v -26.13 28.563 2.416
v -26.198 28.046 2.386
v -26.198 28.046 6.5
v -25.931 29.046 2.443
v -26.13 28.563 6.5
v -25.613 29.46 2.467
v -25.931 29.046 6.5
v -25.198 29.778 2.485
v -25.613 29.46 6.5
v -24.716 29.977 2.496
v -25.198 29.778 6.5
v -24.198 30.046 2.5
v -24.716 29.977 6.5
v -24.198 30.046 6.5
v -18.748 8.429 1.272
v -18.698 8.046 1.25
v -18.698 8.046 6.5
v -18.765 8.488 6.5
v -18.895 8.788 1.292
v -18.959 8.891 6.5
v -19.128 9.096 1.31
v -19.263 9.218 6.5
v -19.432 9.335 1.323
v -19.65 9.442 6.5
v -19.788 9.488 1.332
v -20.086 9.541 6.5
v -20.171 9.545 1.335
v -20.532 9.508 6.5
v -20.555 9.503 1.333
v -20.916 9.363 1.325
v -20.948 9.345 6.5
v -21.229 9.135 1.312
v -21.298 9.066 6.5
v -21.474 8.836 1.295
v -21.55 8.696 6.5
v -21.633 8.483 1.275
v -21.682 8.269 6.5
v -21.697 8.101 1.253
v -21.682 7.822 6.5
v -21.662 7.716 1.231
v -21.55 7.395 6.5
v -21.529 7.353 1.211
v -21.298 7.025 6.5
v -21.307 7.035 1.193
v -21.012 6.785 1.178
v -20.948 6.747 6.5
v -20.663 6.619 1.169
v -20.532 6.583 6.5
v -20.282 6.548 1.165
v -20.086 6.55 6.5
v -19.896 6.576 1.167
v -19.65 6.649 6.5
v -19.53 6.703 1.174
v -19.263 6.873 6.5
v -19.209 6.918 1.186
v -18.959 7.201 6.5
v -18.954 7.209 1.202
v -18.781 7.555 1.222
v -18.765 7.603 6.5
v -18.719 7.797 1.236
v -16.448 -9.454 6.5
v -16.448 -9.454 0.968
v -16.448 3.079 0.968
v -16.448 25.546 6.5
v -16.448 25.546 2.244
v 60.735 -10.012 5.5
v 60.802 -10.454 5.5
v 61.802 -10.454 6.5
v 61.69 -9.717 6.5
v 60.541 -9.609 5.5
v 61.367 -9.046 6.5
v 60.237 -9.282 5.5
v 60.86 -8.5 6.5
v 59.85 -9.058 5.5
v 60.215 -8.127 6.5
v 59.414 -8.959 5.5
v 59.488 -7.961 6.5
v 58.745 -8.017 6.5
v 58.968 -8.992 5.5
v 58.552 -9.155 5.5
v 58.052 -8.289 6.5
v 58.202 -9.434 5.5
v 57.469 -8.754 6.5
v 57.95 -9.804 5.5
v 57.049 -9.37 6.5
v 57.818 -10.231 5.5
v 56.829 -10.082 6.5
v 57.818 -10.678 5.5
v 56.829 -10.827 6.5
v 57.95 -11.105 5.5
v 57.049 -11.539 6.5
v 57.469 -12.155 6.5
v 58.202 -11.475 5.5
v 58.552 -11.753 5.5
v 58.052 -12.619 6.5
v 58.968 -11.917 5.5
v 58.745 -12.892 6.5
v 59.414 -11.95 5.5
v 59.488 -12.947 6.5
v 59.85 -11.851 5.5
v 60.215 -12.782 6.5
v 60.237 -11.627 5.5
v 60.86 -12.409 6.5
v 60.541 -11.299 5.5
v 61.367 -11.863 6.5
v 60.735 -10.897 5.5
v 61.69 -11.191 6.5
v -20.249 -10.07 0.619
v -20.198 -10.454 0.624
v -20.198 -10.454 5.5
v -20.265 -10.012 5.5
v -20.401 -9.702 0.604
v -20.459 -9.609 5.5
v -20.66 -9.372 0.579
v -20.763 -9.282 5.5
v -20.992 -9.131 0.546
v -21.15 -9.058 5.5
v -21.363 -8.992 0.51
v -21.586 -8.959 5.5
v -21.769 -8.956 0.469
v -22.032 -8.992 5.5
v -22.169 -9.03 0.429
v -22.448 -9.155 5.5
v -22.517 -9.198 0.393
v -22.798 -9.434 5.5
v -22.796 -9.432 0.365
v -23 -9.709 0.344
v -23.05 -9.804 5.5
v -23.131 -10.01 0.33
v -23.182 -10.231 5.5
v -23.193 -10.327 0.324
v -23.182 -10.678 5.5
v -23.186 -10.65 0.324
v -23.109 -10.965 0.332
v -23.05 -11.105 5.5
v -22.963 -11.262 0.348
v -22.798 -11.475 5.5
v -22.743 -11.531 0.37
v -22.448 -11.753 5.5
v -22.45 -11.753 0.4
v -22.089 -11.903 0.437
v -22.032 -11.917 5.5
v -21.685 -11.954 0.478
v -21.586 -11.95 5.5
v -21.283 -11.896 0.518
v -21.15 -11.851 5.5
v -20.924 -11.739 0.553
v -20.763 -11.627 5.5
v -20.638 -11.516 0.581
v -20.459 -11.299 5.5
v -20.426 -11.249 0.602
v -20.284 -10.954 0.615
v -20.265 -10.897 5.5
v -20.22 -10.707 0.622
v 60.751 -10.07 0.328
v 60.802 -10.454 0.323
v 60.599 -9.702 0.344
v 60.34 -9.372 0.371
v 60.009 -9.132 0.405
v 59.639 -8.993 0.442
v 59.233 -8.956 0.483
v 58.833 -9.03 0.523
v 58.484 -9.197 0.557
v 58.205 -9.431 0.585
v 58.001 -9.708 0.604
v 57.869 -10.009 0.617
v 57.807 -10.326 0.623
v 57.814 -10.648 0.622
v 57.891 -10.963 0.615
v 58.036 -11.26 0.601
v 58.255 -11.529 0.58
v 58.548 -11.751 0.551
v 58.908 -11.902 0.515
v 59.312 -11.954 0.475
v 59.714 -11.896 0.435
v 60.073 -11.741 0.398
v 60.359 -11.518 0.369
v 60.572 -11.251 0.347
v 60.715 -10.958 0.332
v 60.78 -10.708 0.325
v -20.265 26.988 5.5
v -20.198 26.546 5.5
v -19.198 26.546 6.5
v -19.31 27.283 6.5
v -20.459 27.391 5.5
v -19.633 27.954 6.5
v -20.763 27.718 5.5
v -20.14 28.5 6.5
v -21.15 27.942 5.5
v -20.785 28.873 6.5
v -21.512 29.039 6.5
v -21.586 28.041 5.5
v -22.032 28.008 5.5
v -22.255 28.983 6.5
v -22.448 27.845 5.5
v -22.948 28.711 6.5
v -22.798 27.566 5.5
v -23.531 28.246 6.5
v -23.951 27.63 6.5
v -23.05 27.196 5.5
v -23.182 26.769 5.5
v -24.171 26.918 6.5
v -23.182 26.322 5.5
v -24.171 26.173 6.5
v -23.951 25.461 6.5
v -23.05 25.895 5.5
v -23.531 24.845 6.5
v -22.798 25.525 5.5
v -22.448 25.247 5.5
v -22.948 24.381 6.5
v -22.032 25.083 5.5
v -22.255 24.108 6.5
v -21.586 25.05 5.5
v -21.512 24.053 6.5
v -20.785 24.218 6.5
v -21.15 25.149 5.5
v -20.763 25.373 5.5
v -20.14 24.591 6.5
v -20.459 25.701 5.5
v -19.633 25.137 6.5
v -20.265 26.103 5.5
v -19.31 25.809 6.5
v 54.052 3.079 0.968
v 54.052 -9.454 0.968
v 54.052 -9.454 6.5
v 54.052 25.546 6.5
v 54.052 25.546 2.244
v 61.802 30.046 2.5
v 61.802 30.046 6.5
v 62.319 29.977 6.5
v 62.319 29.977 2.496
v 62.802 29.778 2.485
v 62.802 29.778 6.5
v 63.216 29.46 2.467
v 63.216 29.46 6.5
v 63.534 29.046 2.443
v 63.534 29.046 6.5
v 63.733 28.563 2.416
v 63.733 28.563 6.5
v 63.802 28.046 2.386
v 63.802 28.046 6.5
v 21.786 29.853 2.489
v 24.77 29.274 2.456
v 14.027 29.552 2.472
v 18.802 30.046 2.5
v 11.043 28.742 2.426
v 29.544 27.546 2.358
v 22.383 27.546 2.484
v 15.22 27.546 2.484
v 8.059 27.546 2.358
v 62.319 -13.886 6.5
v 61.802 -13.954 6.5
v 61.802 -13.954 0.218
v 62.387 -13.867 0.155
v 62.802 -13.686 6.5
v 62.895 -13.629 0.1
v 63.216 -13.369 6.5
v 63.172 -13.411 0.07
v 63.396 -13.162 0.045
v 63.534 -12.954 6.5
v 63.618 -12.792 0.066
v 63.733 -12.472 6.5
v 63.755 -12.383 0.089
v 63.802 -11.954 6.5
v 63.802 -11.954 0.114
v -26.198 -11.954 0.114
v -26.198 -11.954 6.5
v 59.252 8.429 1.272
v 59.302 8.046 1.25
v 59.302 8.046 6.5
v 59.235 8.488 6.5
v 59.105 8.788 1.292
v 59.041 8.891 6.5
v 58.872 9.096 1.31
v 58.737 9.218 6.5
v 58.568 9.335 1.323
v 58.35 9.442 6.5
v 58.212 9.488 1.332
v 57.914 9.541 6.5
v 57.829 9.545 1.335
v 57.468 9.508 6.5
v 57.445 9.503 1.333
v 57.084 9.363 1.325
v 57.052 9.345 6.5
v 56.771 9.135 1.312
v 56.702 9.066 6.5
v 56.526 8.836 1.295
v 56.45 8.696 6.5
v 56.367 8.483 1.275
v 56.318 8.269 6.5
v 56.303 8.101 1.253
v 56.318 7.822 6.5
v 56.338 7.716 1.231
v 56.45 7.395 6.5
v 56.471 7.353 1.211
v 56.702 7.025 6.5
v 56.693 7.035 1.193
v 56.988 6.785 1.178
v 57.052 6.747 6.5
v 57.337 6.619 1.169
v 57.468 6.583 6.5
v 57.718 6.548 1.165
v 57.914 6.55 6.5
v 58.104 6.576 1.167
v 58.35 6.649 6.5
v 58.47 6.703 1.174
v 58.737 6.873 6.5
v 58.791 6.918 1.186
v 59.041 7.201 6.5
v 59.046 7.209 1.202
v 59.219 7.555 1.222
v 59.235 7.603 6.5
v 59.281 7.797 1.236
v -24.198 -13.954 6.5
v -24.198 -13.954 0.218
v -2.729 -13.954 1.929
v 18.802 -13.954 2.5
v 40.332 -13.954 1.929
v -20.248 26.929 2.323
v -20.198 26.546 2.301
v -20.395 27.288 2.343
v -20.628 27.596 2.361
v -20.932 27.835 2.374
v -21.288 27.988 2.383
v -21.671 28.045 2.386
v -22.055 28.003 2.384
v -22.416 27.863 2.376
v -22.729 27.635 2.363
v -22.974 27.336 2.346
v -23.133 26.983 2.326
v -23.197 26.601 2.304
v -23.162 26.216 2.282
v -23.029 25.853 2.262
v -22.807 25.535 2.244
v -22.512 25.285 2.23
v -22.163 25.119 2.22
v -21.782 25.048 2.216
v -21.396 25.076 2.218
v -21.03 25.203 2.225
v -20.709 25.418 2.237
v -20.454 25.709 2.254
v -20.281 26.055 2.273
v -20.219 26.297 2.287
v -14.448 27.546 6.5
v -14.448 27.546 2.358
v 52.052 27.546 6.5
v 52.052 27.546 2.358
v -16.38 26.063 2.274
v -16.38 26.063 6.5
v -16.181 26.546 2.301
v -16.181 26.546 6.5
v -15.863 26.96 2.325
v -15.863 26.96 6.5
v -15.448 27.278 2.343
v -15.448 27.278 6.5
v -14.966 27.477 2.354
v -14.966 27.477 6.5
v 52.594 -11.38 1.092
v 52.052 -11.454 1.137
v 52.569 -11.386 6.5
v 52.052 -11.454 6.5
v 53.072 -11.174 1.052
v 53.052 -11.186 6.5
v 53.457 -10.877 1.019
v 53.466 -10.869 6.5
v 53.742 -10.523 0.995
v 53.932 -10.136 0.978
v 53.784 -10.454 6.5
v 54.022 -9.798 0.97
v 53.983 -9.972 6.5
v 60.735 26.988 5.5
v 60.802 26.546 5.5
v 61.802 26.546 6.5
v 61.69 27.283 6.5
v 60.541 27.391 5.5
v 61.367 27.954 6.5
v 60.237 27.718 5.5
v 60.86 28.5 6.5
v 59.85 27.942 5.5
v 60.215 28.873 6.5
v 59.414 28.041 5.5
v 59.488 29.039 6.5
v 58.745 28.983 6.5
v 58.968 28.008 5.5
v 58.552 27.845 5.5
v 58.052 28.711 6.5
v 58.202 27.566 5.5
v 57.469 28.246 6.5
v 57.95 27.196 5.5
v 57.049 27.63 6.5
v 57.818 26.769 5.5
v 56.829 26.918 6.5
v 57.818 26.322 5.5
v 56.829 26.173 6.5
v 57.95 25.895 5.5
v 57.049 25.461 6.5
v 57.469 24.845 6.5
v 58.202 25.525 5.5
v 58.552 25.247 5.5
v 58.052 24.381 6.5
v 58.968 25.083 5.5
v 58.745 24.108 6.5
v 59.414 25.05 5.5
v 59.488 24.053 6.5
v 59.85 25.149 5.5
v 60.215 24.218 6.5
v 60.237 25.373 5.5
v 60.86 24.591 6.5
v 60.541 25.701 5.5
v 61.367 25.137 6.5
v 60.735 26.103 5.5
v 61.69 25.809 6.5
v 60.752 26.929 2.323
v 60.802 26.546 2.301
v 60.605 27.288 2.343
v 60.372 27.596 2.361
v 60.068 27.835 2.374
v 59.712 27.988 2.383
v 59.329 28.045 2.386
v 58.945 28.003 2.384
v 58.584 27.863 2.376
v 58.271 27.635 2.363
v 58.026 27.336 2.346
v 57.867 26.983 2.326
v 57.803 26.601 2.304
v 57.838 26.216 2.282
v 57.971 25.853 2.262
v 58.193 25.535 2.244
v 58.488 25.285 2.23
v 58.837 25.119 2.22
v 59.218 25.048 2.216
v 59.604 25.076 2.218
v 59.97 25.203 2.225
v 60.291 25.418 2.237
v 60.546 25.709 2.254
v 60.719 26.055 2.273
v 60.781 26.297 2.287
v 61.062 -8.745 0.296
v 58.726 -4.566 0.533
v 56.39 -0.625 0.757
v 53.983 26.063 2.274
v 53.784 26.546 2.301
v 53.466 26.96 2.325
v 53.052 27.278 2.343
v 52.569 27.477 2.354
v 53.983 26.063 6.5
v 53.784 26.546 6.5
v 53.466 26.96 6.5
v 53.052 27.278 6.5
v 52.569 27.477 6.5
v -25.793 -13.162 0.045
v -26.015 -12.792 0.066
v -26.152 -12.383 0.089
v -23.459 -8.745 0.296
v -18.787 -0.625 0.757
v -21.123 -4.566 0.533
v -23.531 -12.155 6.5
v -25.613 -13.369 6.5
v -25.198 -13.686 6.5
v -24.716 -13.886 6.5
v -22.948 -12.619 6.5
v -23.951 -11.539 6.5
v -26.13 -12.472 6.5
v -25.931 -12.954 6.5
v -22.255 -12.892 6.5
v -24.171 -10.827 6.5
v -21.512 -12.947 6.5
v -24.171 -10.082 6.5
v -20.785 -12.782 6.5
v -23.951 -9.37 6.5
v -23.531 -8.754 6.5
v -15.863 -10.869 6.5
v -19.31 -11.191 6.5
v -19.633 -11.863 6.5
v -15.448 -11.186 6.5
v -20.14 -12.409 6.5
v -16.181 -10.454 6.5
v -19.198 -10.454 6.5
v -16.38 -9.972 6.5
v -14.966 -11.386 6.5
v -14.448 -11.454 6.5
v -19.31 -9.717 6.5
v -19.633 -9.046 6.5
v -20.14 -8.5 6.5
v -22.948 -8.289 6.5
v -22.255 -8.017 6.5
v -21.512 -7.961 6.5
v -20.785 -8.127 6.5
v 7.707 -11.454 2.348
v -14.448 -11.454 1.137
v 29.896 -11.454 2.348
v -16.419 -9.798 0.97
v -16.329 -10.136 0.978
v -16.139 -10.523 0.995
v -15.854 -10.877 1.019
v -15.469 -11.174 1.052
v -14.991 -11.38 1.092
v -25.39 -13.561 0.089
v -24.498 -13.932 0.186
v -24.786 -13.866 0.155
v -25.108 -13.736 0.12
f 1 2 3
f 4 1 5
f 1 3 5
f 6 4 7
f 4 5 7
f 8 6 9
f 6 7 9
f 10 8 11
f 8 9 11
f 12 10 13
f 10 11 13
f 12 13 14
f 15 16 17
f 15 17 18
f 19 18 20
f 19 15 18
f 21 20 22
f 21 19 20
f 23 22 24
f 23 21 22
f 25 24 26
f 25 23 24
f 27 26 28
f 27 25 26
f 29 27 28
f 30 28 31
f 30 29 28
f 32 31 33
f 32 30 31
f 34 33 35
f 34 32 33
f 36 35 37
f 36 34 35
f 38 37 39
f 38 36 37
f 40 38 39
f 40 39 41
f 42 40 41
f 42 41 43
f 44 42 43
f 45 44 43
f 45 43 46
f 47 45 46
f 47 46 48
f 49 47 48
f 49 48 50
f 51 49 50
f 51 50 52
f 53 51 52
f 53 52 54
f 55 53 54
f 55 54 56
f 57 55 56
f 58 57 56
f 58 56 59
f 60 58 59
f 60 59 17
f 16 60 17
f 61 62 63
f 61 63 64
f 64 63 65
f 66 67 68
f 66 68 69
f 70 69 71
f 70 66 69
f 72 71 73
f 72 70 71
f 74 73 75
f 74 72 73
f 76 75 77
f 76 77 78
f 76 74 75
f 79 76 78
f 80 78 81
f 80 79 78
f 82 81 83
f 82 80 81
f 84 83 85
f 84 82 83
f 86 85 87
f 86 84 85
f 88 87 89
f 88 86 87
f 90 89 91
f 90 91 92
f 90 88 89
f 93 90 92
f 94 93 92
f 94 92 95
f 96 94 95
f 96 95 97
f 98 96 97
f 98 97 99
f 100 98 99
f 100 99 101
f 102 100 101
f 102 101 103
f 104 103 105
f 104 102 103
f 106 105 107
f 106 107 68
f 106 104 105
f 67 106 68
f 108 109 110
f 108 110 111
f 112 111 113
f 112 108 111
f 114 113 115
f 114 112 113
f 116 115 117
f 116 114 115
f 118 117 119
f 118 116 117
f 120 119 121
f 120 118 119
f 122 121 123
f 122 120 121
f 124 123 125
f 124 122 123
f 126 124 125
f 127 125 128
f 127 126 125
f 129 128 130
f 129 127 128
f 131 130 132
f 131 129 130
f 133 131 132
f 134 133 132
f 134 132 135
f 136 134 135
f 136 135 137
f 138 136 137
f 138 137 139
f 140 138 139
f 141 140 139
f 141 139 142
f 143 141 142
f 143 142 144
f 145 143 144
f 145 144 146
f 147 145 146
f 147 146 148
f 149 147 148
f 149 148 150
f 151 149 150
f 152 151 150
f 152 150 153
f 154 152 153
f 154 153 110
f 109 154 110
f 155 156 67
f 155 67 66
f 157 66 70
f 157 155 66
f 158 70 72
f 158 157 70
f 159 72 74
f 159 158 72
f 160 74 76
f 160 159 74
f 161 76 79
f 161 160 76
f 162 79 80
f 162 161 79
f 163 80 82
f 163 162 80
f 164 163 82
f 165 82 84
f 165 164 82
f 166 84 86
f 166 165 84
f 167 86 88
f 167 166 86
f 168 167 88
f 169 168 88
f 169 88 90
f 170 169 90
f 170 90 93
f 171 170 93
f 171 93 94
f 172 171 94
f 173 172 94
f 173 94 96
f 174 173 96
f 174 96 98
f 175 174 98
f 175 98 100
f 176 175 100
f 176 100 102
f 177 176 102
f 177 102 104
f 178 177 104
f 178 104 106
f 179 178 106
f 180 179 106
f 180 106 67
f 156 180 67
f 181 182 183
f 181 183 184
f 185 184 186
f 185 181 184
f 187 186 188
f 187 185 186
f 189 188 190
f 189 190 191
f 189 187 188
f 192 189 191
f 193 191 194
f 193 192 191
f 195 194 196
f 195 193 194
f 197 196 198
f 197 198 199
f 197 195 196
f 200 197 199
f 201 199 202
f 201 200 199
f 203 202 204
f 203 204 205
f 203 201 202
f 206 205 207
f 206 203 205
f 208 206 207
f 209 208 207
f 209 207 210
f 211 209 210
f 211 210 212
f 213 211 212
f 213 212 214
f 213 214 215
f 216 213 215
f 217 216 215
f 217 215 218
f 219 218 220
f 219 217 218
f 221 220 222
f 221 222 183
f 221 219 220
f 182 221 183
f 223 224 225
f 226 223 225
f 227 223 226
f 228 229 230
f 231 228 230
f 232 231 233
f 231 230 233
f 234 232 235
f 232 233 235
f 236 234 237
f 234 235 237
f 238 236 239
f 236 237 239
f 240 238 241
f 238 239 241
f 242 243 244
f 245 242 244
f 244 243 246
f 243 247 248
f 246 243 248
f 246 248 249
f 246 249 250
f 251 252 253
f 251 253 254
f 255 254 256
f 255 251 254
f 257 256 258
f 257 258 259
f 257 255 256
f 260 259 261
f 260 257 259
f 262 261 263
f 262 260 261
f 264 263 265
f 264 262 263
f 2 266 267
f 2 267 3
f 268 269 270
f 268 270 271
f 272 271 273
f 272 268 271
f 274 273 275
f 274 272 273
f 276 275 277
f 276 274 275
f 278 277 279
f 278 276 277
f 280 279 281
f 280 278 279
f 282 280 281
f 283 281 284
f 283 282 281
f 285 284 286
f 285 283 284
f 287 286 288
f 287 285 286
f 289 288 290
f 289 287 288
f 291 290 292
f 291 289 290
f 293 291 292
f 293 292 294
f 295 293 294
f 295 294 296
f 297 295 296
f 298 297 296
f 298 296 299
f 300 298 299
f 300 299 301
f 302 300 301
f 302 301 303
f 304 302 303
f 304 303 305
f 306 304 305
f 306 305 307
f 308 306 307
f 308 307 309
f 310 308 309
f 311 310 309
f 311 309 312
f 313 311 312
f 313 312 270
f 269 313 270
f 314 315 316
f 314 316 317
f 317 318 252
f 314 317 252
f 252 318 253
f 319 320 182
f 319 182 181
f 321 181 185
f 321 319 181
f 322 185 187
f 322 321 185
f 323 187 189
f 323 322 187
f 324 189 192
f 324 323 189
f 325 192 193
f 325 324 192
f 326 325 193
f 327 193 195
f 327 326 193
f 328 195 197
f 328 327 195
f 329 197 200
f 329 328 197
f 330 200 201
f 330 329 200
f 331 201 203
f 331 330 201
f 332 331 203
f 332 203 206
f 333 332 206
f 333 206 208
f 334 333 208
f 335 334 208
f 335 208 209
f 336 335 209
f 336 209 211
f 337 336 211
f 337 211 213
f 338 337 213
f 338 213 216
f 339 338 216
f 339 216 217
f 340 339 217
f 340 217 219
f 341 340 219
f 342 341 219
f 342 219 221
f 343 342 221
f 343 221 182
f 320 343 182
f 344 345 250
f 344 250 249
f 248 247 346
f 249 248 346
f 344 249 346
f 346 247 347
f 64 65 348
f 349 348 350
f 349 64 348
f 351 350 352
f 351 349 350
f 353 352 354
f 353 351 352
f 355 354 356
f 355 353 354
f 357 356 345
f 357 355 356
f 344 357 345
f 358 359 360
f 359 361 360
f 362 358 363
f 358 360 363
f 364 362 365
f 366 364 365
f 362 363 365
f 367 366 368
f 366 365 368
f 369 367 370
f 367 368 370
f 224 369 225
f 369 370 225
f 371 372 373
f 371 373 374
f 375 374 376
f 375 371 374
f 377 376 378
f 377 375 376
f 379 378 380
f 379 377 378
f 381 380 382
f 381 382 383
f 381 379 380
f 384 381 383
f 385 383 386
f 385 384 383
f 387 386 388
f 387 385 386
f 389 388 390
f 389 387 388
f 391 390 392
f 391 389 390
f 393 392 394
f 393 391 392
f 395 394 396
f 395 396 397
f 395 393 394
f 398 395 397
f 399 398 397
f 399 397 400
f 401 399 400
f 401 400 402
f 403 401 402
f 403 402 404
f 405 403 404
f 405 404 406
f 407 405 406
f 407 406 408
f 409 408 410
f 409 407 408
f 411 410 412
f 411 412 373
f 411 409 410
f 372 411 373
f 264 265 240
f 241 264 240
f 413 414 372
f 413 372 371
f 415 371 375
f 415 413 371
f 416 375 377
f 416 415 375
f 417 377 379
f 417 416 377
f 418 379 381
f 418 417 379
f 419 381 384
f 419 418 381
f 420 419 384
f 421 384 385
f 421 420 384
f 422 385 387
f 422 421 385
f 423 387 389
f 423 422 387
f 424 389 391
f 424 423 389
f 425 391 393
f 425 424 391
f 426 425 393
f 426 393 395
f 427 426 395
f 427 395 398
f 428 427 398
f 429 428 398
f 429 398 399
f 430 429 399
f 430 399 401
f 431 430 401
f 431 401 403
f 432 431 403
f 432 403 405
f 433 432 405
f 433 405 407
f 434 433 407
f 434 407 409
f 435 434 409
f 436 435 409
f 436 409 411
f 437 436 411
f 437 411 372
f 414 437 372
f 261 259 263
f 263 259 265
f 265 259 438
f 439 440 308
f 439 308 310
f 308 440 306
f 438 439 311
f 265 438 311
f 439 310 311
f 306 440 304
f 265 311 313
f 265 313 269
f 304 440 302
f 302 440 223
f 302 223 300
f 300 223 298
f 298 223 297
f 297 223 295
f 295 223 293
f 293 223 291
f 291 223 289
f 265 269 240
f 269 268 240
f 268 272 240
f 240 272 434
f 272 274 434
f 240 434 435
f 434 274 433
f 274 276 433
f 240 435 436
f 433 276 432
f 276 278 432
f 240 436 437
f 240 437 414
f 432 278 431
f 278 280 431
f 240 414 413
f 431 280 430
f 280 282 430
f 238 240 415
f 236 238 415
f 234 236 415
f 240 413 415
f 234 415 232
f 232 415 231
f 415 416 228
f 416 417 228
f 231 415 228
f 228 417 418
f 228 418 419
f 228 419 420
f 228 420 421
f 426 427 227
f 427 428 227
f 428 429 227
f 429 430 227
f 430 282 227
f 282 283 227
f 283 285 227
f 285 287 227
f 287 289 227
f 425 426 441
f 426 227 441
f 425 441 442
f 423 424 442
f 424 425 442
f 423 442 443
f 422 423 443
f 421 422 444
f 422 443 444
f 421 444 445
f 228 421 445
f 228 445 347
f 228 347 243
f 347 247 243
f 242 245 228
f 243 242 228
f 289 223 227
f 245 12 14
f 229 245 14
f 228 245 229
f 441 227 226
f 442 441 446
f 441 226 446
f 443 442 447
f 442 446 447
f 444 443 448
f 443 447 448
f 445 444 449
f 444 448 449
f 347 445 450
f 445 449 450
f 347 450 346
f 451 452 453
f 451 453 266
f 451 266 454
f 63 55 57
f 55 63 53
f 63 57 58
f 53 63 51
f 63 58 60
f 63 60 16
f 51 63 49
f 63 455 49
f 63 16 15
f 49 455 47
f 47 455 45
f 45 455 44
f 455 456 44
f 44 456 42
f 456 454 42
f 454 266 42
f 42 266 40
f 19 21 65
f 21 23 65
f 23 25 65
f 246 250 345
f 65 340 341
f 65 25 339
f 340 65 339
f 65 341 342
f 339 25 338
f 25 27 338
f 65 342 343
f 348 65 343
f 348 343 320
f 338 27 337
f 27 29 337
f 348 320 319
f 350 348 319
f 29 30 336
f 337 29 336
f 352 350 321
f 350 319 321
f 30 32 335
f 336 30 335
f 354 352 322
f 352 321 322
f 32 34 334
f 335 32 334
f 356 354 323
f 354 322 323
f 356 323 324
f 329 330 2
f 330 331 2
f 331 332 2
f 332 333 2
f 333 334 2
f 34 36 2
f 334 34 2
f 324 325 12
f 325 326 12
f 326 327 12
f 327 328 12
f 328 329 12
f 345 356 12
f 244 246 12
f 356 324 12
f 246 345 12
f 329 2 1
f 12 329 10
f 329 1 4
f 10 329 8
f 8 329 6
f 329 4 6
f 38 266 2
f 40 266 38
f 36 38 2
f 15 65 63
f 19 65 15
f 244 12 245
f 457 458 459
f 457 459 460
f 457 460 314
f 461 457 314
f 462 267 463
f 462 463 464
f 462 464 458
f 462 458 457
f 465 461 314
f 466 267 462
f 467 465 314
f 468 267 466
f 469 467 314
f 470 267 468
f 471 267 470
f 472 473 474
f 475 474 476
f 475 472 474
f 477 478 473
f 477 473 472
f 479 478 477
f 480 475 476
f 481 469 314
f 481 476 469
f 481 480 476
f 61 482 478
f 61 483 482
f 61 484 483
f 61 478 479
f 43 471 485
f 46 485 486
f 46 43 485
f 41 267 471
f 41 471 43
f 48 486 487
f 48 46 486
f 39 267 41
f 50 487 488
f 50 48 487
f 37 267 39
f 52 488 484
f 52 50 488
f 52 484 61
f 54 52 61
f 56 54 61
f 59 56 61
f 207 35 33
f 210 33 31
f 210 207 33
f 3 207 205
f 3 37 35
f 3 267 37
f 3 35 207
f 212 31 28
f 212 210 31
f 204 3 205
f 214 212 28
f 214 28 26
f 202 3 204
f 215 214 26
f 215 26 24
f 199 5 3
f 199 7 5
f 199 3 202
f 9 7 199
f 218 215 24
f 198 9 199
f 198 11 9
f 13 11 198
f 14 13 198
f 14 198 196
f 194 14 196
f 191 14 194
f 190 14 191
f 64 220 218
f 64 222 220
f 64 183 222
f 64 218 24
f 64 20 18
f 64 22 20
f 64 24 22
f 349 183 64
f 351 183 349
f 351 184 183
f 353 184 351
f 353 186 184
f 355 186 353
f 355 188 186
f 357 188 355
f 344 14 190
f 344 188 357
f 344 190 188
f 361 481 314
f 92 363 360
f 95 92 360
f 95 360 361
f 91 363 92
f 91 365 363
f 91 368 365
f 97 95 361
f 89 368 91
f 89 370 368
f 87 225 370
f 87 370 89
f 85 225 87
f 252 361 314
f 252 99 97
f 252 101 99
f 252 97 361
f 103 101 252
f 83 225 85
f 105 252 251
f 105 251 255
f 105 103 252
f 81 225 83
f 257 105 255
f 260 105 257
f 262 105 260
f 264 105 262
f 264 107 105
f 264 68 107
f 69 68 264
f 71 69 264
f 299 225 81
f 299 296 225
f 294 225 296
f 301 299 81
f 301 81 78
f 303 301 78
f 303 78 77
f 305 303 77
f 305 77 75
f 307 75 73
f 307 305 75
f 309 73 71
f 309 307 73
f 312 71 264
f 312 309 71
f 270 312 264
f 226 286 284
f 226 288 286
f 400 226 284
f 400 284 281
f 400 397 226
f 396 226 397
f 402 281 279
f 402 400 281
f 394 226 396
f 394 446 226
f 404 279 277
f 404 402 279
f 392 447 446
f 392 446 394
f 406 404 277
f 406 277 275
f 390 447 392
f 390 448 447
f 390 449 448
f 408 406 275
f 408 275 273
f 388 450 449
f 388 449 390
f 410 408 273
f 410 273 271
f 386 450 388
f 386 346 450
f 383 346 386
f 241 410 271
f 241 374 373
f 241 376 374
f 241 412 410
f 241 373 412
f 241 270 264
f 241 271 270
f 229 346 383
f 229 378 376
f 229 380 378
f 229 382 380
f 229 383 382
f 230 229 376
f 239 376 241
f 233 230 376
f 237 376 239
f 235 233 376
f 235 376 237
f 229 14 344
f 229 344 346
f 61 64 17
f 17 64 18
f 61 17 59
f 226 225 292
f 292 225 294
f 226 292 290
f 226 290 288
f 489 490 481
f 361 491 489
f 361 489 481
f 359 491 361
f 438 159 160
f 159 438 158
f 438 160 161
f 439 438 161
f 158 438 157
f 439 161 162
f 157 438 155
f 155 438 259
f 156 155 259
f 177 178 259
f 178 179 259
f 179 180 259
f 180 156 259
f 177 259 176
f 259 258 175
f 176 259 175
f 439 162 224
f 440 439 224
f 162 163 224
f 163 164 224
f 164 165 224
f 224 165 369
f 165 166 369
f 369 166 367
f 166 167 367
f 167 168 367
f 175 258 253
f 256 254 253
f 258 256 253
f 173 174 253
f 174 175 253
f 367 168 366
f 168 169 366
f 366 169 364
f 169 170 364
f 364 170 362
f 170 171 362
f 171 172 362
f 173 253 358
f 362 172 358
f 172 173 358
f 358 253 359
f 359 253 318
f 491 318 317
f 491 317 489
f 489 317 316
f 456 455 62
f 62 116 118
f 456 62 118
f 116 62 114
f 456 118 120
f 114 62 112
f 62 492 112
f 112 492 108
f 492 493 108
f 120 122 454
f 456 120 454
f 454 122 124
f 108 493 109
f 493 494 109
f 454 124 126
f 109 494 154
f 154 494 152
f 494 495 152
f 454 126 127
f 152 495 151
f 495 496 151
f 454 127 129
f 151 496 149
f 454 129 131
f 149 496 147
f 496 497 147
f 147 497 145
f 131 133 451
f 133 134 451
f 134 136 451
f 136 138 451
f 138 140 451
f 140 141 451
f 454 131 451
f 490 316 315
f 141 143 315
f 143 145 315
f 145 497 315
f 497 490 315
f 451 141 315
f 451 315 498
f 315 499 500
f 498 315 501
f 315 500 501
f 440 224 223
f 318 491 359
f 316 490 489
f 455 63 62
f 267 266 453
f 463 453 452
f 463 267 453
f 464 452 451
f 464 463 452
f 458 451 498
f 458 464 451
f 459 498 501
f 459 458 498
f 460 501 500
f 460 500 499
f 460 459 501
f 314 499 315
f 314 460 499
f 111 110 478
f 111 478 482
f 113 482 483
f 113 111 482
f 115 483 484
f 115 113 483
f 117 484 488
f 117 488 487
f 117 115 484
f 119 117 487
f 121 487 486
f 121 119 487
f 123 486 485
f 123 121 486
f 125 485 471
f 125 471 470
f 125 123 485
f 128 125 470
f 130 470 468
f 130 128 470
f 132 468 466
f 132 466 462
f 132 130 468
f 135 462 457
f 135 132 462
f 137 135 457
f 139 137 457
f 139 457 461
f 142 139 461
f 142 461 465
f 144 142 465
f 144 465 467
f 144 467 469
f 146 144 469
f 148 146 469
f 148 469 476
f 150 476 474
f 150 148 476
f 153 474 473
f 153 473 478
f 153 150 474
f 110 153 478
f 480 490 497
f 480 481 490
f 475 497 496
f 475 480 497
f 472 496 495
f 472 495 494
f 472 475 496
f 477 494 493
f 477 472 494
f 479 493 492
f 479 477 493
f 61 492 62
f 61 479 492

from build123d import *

# Parameters (mm, degrees)
F0_W     = 90
F0_H     = 44
F0_R     = 1.5
F0_W_2   = 70.5
F0_H_2   = 39
F1_DEPTH = 6.5
F3_DEPTH = 44.001
F4_SIZE  = 1
F6_R     = 2
F7_DEPTH = 90.001


with BuildPart() as f1:
    # F0 (on Top) → F1 (new body)
    with BuildSketch(Plane.XY):
        with Locations((18.801508, 8.04563)):
            Rectangle(F0_W, F0_H)
        with Locations((-21.698492, -10.45437)):
            Circle(F0_R, mode=Mode.SUBTRACT)
        with Locations((-20.198492, 8.04563)):
            Circle(F0_R, mode=Mode.SUBTRACT)
        with Locations((59.301508, -10.45437)):
            Circle(F0_R, mode=Mode.SUBTRACT)
        with Locations((57.801508, 8.04563)):
            Circle(F0_R, mode=Mode.SUBTRACT)
        with Locations((18.801508, 8.04563)):
            Rectangle(F0_W_2, F0_H_2, mode=Mode.SUBTRACT)
        with Locations((-21.698492, 26.54563)):
            Circle(F0_R, mode=Mode.SUBTRACT)
        with Locations((59.301508, 26.54563)):
            Circle(F0_R, mode=Mode.SUBTRACT)
    extrude(amount=F1_DEPTH)

    # F2 (on face) → F3 (cut, through all)
    with BuildSketch(Plane.XZ.offset(13.95437)):
        with BuildLine():
            ThreePointArc((63.801508, 0), (18.801508, 2.5), (-26.198492, 0))
            Line((-26.198492, 0), (63.801508, 0))
        make_face()
    extrude(amount=-F3_DEPTH, mode=Mode.SUBTRACT)

    # F4
    f4_edges = [f1.edges().sort_by_distance(p)[0] for p in [
        (57.801508, 26.54563, 6.5),
        (-23.198492, 26.54563, 6.5),
        (-23.198492, -10.45437, 6.5),
        (57.801508, -10.45437, 6.5),
    ]]
    chamfer(f4_edges, length=F4_SIZE)

    # F6
    f6_edges = [f1.edges().sort_by_distance(p)[0] for p in [
        (-16.448492, 27.54563, 3.733901),
        (54.051508, 27.54563, 3.733901),
        (54.051508, -11.45437, 3.733901),
        (-16.448492, -11.45437, 3.733901),
        (63.801508, 30.04563, 3.25),
        (63.801508, -13.95437, 3.25),
        (-26.198492, 30.04563, 3.25),
        (-26.198492, -13.95437, 3.25),
    ]]
    fillet(f6_edges, radius=F6_R)

    # F5 (on face) → F7 (cut, through all)
    with BuildSketch(Plane(origin=(-26.198492, 0, 0), x_dir=(0, -1, 0), z_dir=(-1, 0, 0))):
        Polygon((13.95437, 0), (-30.04563, 2.5), (-30.04563, 0), align=None)
    extrude(amount=-F7_DEPTH, mode=Mode.SUBTRACT)


solid = f1.part
